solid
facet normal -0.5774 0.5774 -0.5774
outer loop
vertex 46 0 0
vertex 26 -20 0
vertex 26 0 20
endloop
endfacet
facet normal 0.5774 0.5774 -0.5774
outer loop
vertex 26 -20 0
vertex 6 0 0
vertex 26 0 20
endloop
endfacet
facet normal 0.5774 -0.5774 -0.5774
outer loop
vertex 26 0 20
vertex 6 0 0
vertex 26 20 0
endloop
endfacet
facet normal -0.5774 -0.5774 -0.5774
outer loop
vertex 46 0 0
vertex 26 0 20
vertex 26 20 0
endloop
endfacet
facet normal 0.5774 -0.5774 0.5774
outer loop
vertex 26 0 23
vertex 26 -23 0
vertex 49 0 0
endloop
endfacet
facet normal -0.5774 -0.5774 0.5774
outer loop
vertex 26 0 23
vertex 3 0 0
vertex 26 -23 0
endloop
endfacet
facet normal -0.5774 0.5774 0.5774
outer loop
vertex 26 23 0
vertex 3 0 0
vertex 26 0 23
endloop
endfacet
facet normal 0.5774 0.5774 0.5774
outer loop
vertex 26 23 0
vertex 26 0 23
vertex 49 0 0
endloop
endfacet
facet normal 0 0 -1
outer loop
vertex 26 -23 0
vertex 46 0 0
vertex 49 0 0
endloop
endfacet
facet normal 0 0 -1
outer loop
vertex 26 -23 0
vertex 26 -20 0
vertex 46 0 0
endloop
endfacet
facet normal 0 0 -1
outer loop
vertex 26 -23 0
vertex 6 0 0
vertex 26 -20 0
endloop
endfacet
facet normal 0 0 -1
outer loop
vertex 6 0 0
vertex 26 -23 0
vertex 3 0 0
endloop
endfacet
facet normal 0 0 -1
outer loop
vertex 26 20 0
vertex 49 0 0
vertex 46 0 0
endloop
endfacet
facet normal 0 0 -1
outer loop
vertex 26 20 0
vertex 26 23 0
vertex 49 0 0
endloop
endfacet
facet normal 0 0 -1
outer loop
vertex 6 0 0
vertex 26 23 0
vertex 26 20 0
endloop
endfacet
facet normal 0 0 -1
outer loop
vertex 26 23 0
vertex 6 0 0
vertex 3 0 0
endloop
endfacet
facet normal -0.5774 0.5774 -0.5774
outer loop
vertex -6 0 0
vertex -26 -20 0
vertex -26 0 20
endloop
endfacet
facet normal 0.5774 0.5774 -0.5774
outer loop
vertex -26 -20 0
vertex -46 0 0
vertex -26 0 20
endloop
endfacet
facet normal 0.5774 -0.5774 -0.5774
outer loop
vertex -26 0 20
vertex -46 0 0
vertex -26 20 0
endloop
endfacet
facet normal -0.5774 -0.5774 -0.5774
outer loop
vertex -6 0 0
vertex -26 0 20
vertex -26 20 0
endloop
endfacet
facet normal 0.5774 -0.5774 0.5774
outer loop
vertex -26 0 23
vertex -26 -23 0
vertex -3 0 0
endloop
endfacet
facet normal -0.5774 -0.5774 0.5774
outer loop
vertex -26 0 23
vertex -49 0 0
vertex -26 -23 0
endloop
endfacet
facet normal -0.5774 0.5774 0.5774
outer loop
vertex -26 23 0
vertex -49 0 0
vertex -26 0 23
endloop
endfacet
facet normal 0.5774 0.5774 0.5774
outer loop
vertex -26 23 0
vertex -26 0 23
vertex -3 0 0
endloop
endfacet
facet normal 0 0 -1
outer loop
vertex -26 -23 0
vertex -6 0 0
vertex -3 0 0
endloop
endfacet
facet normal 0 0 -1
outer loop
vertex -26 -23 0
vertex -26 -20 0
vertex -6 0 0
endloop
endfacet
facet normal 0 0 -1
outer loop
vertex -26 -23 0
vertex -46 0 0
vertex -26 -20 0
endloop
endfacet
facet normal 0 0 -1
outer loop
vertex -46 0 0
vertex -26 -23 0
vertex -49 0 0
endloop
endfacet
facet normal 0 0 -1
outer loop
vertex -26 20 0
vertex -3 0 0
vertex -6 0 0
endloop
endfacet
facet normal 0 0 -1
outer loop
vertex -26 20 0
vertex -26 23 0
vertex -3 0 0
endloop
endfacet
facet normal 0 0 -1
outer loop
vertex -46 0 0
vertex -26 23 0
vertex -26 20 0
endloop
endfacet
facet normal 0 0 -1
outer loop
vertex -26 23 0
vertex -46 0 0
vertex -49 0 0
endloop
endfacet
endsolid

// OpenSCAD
inside_radius = 20; //[1:100]
thickness=3; //[1:10]


translate([inside_radius+2*thickness,0,0])
polyhedron(
  points=concat(inside_radius*[ [1,0,0],[0,-1,0],[-1,0,0],[0,1,0], // the four points at base
           [0,0,1]  ],     // the apex point 
              (inside_radius+thickness)*[ [1,0,0],[0,-1,0],[-1,0,0],[0,1,0], // the four points at base
           [0,0,1]  ]),     // the apex point
  faces=[ [0,1,4],[1,2,4],[2,3,4],[3,0,4],              // each triangle side
          [0,4,1]+[5,5,5],[1,4,2]+[5,5,5],[2,4,3]+[5,5,5],[3,4,0]+[5,5,5],
          [1,0,5,6], [2,1,6,7],[3,2,7,8],[0,3,8,5]  ]
 );
 
 translate(-1*[inside_radius+2*thickness,0,0])
polyhedron(
  points=concat(inside_radius*[ [1,0,0],[0,-1,0],[-1,0,0],[0,1,0], // the four points at base
           [0,0,1]  ],     // the apex point 
              (inside_radius+thickness)*[ [1,0,0],[0,-1,0],[-1,0,0],[0,1,0], // the four points at base
           [0,0,1]  ]),     // the apex point
  faces=[ [0,1,4],[1,2,4],[2,3,4],[3,0,4],              // each triangle side
          [0,4,1]+[5,5,5],[1,4,2]+[5,5,5],[2,4,3]+[5,5,5],[3,4,0]+[5,5,5],
          [1,0,5,6], [2,1,6,7],[3,2,7,8],[0,3,8,5]  ]
 );
